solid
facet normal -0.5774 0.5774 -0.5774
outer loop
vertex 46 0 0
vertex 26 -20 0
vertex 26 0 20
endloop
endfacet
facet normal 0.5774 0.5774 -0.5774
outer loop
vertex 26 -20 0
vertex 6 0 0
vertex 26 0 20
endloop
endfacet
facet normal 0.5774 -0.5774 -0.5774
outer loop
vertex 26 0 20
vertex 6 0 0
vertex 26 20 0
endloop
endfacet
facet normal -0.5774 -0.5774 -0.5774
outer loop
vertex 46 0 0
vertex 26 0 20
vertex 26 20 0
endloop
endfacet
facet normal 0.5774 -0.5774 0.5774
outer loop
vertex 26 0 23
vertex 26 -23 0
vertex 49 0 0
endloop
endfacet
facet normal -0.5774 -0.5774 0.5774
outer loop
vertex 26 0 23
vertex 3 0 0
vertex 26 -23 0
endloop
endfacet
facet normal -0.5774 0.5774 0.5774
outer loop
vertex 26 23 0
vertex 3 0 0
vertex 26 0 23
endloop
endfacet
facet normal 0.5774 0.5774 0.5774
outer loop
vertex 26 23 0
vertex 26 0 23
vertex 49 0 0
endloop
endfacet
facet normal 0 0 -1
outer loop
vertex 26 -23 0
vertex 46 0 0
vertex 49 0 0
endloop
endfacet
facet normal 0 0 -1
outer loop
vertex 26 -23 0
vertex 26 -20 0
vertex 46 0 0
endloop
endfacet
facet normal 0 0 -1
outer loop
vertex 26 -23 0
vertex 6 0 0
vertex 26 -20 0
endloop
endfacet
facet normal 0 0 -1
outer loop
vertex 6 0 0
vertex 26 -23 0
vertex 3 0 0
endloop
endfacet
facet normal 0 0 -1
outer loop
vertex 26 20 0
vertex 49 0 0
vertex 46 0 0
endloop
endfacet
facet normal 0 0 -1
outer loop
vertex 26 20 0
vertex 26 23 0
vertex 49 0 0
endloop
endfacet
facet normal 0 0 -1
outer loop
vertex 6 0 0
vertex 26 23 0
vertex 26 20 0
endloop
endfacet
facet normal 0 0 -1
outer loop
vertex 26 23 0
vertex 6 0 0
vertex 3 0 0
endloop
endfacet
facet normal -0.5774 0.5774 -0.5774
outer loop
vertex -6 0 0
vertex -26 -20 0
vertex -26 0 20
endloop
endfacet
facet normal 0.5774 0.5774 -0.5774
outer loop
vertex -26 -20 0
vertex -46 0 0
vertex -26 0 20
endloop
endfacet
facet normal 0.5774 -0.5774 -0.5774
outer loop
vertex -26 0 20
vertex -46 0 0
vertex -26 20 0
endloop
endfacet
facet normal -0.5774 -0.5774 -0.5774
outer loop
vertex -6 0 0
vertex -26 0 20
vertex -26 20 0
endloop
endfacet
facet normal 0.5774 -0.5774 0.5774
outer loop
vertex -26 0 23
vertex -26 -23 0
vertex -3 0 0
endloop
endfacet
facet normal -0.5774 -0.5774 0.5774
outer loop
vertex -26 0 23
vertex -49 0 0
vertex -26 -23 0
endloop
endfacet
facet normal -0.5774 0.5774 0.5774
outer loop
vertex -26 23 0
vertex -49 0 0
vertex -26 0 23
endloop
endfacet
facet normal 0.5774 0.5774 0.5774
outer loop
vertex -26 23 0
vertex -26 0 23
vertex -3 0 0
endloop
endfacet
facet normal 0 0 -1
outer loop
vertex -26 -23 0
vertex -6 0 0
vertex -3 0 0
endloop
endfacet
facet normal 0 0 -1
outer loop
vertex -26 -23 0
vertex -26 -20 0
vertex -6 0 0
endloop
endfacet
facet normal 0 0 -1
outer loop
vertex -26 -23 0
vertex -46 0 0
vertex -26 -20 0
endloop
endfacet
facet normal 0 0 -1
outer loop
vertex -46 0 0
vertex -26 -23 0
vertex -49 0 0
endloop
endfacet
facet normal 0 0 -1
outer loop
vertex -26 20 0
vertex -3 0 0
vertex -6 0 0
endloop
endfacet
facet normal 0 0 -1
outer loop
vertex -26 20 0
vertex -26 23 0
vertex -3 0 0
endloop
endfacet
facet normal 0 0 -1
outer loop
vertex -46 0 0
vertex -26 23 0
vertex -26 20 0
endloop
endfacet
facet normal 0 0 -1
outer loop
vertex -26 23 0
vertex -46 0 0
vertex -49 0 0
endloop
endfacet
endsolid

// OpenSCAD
inside_radius = 20; //[1:100]
thickness=3; //[1:10]


translate([inside_radius+2*thickness,0,0])
polyhedron(
  points=concat(inside_radius*[ [1,0,0],[0,-1,0],[-1,0,0],[0,1,0], // the four points at base
           [0,0,1]  ],     // the apex point 
              (inside_radius+thickness)*[ [1,0,0],[0,-1,0],[-1,0,0],[0,1,0], // the four points at base
           [0,0,1]  ]),     // the apex point
  faces=[ [0,1,4],[1,2,4],[2,3,4],[3,0,4],              // each triangle side
          [0,4,1]+[5,5,5],[1,4,2]+[5,5,5],[2,4,3]+[5,5,5],[3,4,0]+[5,5,5],
          [1,0,5,6], [2,1,6,7],[3,2,7,8],[0,3,8,5]  ]
 );
 
 translate(-1*[inside_radius+2*thickness,0,0])
polyhedron(
  points=concat(inside_radius*[ [1,0,0],[0,-1,0],[-1,0,0],[0,1,0], // the four points at base
           [0,0,1]  ],     // the apex point 
              (inside_radius+thickness)*[ [1,0,0],[0,-1,0],[-1,0,0],[0,1,0], // the four points at base
           [0,0,1]  ]),     // the apex point
  faces=[ [0,1,4],[1,2,4],[2,3,4],[3,0,4],              // each triangle side
          [0,4,1]+[5,5,5],[1,4,2]+[5,5,5],[2,4,3]+[5,5,5],[3,4,0]+[5,5,5],
          [1,0,5,6], [2,1,6,7],[3,2,7,8],[0,3,8,5]  ]
 );
